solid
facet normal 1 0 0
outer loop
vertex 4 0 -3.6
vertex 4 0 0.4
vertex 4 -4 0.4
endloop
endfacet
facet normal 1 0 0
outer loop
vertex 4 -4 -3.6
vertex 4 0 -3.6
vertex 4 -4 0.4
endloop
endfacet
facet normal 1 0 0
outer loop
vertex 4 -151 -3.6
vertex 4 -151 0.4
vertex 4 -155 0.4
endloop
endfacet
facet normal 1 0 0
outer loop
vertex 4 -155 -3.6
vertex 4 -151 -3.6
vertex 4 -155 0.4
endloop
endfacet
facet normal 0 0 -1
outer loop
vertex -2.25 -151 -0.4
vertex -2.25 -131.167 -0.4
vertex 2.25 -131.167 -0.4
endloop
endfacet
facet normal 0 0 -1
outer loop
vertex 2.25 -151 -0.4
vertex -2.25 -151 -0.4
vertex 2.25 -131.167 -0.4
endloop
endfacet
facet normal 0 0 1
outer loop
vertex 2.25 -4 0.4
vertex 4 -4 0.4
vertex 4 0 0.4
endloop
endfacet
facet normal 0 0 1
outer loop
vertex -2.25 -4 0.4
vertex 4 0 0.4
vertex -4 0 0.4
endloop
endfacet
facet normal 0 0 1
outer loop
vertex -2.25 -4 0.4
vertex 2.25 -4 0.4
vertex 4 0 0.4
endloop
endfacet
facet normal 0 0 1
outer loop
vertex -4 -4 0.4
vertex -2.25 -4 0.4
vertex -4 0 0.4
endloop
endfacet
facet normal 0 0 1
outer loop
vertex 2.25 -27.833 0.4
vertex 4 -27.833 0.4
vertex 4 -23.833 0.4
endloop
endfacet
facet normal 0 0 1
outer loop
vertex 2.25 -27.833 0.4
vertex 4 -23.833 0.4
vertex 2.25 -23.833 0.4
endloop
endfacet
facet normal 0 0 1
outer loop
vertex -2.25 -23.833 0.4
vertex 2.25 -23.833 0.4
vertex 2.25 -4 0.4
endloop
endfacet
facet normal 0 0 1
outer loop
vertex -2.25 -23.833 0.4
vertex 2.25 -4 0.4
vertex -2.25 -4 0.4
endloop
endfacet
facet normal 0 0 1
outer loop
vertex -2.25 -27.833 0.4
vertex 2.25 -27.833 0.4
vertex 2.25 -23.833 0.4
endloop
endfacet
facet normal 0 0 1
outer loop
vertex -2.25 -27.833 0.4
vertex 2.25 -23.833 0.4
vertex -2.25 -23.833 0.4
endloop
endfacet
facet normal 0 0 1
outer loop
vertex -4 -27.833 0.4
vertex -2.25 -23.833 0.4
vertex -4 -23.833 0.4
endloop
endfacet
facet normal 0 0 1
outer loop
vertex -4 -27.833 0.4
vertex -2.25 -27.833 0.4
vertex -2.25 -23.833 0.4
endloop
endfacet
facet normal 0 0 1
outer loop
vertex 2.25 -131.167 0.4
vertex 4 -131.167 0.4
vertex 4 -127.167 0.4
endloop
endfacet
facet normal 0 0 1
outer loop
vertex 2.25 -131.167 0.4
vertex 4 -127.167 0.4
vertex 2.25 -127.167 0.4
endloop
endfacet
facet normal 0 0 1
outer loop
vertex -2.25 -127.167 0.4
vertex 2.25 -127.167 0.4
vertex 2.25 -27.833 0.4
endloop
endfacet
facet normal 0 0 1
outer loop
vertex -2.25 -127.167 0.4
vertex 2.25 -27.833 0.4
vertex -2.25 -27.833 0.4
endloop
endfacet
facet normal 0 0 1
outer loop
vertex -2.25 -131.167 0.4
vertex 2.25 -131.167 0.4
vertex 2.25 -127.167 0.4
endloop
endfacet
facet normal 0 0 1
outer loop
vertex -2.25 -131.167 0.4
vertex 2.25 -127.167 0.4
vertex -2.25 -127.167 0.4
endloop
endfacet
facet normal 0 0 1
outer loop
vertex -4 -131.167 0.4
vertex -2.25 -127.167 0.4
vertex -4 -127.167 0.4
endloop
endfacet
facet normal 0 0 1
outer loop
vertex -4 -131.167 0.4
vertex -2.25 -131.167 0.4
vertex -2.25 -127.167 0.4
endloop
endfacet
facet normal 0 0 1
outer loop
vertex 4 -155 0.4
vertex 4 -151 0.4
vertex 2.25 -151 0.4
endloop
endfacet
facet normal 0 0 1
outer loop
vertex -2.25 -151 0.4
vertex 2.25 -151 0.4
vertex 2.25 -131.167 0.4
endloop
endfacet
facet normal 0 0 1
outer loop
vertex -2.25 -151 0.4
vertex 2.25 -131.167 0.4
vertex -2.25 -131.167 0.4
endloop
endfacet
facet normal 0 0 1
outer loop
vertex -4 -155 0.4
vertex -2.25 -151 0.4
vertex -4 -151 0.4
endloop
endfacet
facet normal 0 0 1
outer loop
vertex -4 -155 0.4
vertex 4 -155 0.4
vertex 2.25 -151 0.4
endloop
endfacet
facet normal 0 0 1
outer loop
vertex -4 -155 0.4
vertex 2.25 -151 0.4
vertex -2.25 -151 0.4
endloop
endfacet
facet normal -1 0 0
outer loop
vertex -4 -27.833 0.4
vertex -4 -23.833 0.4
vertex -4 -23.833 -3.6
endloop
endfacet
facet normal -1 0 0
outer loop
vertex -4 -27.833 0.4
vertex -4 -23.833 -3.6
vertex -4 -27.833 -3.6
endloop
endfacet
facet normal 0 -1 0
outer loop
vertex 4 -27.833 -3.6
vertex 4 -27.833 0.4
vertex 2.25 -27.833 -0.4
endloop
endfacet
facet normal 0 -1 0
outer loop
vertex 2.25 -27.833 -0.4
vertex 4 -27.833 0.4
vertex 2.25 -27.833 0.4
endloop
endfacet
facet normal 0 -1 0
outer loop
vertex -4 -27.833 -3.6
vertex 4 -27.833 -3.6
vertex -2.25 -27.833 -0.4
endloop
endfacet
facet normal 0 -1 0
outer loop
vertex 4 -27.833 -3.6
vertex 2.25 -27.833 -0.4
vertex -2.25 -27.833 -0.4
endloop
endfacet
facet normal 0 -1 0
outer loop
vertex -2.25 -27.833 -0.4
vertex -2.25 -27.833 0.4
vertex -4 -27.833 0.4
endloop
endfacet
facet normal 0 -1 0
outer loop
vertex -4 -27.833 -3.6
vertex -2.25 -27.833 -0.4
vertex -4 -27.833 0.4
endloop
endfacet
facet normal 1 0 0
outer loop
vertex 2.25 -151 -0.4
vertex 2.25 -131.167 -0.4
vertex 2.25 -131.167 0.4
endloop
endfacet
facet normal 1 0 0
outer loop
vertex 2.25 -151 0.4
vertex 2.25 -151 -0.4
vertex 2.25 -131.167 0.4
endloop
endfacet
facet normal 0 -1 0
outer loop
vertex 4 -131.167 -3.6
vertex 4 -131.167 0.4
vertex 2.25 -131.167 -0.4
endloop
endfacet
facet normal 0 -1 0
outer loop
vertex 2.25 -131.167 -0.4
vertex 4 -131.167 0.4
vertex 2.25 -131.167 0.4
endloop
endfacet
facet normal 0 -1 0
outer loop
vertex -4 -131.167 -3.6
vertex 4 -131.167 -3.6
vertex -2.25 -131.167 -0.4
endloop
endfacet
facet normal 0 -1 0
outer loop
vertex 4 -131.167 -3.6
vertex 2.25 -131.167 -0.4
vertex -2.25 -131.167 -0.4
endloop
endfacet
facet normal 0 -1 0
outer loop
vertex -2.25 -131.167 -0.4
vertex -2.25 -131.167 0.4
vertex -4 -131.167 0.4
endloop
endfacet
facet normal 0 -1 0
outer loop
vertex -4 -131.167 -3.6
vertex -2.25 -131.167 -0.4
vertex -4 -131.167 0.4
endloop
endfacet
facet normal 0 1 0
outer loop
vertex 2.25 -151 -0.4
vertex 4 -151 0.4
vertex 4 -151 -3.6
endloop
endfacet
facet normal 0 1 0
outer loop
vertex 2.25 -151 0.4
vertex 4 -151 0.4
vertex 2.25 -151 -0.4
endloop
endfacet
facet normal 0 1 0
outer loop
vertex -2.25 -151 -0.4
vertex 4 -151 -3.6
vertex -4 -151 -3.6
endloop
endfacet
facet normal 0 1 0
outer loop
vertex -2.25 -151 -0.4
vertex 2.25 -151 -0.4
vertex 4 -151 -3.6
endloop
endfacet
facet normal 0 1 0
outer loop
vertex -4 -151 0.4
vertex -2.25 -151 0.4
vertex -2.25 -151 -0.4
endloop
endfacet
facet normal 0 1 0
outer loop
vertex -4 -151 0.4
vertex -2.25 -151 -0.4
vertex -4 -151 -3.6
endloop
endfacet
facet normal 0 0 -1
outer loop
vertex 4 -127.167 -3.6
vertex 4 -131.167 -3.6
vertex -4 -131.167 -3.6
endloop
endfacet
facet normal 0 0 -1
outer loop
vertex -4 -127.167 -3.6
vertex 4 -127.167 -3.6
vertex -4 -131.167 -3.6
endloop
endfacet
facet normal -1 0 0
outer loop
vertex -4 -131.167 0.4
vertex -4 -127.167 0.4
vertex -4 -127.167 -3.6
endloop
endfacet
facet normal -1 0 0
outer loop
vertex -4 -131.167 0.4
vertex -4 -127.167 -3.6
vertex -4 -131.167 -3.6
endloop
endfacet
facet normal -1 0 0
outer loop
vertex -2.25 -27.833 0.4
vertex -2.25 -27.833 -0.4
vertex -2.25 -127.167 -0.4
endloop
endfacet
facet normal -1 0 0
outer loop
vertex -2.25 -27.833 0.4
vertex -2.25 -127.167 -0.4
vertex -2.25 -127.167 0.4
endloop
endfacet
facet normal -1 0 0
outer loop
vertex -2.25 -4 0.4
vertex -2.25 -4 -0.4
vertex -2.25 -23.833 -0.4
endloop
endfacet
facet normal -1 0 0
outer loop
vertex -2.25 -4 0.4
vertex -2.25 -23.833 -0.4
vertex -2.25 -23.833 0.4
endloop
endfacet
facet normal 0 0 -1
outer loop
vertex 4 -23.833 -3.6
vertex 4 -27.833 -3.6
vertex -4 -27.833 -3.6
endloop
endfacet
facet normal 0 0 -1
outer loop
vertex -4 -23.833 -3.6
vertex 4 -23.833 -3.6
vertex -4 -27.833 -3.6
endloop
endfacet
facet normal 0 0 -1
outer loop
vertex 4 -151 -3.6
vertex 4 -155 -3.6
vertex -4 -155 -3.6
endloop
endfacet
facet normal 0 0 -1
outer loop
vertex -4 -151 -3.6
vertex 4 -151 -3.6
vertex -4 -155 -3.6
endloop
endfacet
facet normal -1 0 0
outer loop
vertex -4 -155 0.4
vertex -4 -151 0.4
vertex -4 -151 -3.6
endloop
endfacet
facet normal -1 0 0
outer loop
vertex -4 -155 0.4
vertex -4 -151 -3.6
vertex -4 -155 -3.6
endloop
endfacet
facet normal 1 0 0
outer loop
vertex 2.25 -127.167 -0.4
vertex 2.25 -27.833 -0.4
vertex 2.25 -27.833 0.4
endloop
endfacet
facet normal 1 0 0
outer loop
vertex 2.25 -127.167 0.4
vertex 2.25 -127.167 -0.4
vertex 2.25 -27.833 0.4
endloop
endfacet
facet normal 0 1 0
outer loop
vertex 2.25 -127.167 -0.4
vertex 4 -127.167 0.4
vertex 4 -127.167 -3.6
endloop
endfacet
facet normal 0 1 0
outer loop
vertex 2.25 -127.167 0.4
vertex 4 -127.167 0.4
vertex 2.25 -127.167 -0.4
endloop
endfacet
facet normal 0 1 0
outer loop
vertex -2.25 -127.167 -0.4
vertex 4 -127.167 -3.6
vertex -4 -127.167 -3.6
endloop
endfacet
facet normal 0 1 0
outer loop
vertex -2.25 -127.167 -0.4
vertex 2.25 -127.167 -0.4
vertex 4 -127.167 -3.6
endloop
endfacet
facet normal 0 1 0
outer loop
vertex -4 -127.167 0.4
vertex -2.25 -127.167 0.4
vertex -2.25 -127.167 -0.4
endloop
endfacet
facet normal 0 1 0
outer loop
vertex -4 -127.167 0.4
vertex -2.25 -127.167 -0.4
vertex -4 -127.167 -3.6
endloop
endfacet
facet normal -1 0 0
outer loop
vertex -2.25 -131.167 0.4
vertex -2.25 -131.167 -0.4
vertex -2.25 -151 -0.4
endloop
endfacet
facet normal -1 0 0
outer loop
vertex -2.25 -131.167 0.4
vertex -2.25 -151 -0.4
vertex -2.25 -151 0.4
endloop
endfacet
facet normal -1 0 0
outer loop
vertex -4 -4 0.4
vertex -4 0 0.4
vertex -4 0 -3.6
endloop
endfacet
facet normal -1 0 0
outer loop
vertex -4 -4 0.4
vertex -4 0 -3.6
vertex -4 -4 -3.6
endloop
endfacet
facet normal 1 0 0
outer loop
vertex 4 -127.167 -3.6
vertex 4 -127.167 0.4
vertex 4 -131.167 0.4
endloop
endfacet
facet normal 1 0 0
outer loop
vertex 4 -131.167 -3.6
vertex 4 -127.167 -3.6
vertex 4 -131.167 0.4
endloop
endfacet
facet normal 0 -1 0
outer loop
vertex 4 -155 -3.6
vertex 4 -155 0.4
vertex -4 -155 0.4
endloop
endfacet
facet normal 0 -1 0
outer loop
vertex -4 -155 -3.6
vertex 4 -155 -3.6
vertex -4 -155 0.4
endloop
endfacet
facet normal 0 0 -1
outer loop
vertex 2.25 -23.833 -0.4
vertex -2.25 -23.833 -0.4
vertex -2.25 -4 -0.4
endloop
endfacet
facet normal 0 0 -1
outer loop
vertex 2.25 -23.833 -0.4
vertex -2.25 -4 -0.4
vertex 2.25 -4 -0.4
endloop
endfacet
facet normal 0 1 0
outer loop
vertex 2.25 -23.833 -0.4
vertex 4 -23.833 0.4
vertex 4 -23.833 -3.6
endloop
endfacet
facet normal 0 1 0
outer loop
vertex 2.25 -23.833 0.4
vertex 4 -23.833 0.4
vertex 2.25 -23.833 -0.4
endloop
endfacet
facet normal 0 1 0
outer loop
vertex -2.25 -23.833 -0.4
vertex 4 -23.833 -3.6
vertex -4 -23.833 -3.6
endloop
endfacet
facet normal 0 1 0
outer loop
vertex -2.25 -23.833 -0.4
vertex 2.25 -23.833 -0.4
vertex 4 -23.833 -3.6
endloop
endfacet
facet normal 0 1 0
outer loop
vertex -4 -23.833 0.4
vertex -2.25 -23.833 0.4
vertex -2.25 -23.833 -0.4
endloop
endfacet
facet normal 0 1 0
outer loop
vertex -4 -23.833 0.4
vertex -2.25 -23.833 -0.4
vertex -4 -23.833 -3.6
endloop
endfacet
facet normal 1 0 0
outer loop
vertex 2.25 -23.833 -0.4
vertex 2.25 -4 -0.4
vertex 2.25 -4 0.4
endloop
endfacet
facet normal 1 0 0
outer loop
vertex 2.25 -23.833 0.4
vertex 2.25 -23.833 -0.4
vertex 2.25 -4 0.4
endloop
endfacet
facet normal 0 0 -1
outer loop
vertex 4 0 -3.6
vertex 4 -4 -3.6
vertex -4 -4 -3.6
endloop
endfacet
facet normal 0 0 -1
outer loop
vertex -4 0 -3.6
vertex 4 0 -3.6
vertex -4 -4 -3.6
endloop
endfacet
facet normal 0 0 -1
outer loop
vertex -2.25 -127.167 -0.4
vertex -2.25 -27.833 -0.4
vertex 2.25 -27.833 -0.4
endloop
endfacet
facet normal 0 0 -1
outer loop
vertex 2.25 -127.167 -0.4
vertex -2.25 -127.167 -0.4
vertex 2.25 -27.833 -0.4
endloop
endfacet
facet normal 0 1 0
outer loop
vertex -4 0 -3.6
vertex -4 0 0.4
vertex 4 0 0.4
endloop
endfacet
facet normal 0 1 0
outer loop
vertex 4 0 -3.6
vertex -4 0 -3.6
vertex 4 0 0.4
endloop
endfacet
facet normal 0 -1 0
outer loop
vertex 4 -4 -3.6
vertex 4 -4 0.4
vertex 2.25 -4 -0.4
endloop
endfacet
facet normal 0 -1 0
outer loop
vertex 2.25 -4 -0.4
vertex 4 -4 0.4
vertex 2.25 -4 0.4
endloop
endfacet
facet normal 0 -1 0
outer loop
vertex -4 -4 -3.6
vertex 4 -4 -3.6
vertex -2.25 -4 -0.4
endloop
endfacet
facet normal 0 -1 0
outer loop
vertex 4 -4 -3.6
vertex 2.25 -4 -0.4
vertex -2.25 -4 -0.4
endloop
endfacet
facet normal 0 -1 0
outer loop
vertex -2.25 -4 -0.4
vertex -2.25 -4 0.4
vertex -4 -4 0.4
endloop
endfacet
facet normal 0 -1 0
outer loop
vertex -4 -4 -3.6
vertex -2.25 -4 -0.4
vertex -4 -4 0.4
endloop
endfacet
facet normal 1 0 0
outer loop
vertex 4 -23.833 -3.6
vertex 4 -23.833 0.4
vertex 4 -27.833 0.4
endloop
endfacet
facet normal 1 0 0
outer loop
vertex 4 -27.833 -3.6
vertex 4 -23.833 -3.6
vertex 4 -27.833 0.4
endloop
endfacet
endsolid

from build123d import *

# Parameters (mm, degrees)
SKETCH_W     = 4.5
SKETCH_H     = 0.8
PAD_DEPTH    = 155
SKETCH002_W  = 8
SKETCH002_H  = 4
PAD001_DEPTH = 4


with BuildPart() as part:
    # Sketch → Pad (new body)
    with BuildSketch(Plane.XZ):
        Rectangle(SKETCH_W, SKETCH_H)
    extrude(amount=PAD_DEPTH)

    # Sketch002 (on Face4 of Pad) → Pad001 (join)
    with BuildSketch(Plane(origin=(0, 0, 0.4), x_dir=(-1, 0, 0), z_dir=(0, 0, 1))):
        with Locations((0, 153)):
            Rectangle(SKETCH002_W, SKETCH002_H)
        with Locations((0, 129.166667)):
            Rectangle(SKETCH002_W, SKETCH002_H)
        with Locations((0, 25.833333)):
            Rectangle(SKETCH002_W, SKETCH002_H)
        with Locations((0, 2)):
            Rectangle(SKETCH002_W, SKETCH002_H)
    extrude(amount=-PAD001_DEPTH)


solid = part.part
